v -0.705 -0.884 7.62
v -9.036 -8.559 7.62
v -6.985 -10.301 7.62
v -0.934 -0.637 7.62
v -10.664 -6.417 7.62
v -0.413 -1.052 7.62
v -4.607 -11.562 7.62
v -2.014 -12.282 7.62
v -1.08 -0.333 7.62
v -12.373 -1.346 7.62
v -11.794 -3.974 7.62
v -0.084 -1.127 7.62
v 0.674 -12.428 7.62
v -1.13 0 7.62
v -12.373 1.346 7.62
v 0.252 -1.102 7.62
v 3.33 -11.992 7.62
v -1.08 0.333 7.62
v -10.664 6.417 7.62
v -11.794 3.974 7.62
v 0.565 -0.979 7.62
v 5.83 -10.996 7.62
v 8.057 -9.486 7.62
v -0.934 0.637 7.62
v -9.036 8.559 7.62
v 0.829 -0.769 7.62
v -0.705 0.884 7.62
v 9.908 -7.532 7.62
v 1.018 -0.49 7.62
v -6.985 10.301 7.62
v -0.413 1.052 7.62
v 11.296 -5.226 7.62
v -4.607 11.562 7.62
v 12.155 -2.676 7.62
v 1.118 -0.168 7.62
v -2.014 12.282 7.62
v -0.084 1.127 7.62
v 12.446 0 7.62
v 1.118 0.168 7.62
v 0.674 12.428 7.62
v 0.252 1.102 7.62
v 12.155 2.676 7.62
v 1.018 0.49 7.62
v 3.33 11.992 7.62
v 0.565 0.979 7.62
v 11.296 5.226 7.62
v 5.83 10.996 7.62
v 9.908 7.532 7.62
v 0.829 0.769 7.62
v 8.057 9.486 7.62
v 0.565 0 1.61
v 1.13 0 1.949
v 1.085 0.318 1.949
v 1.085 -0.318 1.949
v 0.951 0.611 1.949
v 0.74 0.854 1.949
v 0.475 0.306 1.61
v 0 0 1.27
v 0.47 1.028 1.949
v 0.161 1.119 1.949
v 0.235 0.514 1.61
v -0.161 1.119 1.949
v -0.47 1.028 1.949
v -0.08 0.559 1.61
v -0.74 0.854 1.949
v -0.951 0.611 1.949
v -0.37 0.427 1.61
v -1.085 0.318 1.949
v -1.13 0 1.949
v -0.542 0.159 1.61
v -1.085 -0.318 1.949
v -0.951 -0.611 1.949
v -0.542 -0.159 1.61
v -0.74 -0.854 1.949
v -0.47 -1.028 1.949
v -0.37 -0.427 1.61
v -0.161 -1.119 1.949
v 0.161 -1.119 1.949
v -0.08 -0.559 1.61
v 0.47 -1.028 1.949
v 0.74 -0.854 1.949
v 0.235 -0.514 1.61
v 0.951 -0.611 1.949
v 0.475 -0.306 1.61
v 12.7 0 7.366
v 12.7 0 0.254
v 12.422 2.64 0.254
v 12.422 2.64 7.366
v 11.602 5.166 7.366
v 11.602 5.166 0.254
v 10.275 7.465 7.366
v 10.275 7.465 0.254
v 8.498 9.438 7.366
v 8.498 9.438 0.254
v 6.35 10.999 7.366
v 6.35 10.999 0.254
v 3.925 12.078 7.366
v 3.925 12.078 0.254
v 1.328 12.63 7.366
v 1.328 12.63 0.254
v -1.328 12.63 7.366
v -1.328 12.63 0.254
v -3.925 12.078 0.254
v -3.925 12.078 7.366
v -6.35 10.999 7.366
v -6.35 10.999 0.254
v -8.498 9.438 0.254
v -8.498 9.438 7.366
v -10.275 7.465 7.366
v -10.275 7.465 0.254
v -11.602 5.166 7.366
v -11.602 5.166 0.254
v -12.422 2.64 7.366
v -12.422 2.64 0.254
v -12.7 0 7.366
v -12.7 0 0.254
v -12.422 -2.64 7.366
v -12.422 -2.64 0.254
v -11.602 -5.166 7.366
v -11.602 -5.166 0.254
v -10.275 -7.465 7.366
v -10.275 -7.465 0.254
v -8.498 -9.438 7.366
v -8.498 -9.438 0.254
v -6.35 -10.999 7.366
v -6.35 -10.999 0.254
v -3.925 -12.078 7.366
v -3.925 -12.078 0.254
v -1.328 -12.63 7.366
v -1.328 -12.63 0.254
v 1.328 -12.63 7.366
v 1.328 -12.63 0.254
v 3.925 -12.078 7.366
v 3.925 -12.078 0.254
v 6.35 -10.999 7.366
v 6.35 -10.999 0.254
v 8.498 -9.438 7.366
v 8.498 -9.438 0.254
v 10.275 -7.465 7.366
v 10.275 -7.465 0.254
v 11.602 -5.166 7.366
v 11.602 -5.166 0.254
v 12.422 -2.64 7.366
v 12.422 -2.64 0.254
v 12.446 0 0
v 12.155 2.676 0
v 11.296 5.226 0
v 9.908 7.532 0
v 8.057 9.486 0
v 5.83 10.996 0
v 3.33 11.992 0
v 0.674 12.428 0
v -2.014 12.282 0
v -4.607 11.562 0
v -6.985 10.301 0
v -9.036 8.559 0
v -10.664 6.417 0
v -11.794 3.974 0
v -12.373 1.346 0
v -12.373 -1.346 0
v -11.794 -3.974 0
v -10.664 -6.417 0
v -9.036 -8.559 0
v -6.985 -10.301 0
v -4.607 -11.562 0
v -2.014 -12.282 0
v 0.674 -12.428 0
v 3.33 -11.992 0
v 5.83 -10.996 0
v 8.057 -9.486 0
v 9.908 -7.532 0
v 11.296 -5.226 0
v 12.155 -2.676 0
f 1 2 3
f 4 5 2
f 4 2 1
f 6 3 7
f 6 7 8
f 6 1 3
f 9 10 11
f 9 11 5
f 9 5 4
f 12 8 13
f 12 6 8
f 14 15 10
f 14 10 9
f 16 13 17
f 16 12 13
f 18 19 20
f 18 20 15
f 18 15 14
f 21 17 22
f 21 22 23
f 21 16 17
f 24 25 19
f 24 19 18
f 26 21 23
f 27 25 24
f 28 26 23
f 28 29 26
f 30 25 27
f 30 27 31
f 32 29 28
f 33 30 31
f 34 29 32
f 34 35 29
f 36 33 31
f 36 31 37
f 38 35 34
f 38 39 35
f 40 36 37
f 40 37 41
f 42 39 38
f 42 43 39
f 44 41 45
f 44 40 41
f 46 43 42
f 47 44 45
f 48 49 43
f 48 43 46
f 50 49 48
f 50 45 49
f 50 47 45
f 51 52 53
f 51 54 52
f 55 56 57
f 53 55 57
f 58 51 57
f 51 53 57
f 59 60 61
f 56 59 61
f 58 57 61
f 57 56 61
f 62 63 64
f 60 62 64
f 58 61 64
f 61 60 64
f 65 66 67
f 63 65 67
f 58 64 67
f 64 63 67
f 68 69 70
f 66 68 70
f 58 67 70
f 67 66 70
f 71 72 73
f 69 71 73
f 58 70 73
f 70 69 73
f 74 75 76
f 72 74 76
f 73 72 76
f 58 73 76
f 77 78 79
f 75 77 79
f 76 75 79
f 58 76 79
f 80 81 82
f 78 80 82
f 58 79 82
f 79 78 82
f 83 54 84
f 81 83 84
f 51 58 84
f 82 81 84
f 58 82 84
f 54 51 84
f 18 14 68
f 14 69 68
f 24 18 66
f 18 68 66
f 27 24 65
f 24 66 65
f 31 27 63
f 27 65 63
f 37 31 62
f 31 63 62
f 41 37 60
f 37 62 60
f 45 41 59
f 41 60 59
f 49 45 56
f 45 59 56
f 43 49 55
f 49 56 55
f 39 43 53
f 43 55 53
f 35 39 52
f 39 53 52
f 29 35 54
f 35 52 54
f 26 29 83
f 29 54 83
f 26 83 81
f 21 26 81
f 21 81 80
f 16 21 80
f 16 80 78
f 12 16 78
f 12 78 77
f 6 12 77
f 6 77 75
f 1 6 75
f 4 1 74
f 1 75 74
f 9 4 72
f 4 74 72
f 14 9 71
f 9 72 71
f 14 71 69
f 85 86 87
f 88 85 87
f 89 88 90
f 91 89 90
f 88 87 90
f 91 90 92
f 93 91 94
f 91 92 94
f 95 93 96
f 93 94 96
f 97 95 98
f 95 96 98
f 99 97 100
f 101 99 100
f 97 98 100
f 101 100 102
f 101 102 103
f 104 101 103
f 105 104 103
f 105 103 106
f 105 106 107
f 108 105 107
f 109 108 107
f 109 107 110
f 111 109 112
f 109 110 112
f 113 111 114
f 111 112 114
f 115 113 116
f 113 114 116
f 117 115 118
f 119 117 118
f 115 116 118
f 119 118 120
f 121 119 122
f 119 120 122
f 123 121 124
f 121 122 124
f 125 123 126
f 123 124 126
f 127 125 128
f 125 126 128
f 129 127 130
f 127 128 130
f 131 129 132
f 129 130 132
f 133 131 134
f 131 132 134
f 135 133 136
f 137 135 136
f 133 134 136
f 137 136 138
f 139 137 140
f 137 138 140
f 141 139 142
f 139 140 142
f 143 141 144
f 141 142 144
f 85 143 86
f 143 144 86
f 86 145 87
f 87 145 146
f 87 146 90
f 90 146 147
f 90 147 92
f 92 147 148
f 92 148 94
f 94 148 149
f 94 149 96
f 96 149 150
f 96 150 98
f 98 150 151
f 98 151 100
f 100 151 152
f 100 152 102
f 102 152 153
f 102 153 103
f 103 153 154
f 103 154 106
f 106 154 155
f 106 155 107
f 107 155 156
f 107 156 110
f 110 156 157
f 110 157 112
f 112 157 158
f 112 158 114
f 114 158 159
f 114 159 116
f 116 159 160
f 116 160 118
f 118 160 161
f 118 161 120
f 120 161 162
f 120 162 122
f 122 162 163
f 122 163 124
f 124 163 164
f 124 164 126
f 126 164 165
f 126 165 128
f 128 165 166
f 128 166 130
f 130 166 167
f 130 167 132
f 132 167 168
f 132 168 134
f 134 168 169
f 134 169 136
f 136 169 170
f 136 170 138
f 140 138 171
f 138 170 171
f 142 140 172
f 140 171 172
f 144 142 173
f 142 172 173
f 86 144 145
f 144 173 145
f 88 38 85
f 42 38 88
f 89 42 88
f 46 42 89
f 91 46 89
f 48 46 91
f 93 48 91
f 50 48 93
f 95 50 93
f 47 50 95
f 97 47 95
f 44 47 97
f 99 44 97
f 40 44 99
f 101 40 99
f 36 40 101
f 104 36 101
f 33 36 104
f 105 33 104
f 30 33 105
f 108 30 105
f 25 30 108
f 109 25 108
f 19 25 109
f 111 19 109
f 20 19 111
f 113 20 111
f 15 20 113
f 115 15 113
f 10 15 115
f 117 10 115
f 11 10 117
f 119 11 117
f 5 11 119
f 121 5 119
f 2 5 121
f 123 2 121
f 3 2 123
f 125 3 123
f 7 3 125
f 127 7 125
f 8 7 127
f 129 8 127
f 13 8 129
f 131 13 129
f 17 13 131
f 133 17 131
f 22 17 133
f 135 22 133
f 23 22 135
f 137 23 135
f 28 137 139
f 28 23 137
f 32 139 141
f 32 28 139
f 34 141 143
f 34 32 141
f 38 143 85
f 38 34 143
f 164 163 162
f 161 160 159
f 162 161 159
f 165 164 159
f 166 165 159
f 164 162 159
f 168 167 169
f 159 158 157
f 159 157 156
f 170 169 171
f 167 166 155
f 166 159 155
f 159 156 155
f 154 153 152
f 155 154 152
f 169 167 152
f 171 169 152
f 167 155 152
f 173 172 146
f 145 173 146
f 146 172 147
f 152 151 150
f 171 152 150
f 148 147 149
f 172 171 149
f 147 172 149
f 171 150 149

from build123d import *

# Parameters (mm, degrees)
SKETCH1_R                 = 12.7
BOSS_EXTRUDE1_DEPTH       = 7.62
F_4_40_TAPPED_HOLE1_D     = 2.2606
F_4_40_TAPPED_HOLE1_DEPTH = 5.670847242
F_4_40_TAPPED_HOLE1_TIP   = 0.679152758
CHAMFER1_SIZE             = 0.254


with BuildPart() as part:
    # Sketch1 → Boss-Extrude1 (new body)
    with BuildSketch(Plane.XY):
        Circle(SKETCH1_R)
    extrude(amount=BOSS_EXTRUDE1_DEPTH)

    # #4-40 Tapped Hole1
    with Locations(Plane.XY.offset(7.62)):
        with Locations((0, 0)):
            Hole(F_4_40_TAPPED_HOLE1_D / 2, depth=F_4_40_TAPPED_HOLE1_DEPTH)
            with Locations((0, 0, -(F_4_40_TAPPED_HOLE1_DEPTH + F_4_40_TAPPED_HOLE1_TIP / 2))):  # 118° drill point
                Cone(0, F_4_40_TAPPED_HOLE1_D / 2, F_4_40_TAPPED_HOLE1_TIP, mode=Mode.SUBTRACT)

    # Chamfer1
    chamfer1_edges = [part.edges().sort_by_distance(p)[0] for p in [
        (-12.7, 0, 0),
        (-12.7, 0, 7.62),
    ]]
    chamfer(chamfer1_edges, length=CHAMFER1_SIZE)


solid = part.part
